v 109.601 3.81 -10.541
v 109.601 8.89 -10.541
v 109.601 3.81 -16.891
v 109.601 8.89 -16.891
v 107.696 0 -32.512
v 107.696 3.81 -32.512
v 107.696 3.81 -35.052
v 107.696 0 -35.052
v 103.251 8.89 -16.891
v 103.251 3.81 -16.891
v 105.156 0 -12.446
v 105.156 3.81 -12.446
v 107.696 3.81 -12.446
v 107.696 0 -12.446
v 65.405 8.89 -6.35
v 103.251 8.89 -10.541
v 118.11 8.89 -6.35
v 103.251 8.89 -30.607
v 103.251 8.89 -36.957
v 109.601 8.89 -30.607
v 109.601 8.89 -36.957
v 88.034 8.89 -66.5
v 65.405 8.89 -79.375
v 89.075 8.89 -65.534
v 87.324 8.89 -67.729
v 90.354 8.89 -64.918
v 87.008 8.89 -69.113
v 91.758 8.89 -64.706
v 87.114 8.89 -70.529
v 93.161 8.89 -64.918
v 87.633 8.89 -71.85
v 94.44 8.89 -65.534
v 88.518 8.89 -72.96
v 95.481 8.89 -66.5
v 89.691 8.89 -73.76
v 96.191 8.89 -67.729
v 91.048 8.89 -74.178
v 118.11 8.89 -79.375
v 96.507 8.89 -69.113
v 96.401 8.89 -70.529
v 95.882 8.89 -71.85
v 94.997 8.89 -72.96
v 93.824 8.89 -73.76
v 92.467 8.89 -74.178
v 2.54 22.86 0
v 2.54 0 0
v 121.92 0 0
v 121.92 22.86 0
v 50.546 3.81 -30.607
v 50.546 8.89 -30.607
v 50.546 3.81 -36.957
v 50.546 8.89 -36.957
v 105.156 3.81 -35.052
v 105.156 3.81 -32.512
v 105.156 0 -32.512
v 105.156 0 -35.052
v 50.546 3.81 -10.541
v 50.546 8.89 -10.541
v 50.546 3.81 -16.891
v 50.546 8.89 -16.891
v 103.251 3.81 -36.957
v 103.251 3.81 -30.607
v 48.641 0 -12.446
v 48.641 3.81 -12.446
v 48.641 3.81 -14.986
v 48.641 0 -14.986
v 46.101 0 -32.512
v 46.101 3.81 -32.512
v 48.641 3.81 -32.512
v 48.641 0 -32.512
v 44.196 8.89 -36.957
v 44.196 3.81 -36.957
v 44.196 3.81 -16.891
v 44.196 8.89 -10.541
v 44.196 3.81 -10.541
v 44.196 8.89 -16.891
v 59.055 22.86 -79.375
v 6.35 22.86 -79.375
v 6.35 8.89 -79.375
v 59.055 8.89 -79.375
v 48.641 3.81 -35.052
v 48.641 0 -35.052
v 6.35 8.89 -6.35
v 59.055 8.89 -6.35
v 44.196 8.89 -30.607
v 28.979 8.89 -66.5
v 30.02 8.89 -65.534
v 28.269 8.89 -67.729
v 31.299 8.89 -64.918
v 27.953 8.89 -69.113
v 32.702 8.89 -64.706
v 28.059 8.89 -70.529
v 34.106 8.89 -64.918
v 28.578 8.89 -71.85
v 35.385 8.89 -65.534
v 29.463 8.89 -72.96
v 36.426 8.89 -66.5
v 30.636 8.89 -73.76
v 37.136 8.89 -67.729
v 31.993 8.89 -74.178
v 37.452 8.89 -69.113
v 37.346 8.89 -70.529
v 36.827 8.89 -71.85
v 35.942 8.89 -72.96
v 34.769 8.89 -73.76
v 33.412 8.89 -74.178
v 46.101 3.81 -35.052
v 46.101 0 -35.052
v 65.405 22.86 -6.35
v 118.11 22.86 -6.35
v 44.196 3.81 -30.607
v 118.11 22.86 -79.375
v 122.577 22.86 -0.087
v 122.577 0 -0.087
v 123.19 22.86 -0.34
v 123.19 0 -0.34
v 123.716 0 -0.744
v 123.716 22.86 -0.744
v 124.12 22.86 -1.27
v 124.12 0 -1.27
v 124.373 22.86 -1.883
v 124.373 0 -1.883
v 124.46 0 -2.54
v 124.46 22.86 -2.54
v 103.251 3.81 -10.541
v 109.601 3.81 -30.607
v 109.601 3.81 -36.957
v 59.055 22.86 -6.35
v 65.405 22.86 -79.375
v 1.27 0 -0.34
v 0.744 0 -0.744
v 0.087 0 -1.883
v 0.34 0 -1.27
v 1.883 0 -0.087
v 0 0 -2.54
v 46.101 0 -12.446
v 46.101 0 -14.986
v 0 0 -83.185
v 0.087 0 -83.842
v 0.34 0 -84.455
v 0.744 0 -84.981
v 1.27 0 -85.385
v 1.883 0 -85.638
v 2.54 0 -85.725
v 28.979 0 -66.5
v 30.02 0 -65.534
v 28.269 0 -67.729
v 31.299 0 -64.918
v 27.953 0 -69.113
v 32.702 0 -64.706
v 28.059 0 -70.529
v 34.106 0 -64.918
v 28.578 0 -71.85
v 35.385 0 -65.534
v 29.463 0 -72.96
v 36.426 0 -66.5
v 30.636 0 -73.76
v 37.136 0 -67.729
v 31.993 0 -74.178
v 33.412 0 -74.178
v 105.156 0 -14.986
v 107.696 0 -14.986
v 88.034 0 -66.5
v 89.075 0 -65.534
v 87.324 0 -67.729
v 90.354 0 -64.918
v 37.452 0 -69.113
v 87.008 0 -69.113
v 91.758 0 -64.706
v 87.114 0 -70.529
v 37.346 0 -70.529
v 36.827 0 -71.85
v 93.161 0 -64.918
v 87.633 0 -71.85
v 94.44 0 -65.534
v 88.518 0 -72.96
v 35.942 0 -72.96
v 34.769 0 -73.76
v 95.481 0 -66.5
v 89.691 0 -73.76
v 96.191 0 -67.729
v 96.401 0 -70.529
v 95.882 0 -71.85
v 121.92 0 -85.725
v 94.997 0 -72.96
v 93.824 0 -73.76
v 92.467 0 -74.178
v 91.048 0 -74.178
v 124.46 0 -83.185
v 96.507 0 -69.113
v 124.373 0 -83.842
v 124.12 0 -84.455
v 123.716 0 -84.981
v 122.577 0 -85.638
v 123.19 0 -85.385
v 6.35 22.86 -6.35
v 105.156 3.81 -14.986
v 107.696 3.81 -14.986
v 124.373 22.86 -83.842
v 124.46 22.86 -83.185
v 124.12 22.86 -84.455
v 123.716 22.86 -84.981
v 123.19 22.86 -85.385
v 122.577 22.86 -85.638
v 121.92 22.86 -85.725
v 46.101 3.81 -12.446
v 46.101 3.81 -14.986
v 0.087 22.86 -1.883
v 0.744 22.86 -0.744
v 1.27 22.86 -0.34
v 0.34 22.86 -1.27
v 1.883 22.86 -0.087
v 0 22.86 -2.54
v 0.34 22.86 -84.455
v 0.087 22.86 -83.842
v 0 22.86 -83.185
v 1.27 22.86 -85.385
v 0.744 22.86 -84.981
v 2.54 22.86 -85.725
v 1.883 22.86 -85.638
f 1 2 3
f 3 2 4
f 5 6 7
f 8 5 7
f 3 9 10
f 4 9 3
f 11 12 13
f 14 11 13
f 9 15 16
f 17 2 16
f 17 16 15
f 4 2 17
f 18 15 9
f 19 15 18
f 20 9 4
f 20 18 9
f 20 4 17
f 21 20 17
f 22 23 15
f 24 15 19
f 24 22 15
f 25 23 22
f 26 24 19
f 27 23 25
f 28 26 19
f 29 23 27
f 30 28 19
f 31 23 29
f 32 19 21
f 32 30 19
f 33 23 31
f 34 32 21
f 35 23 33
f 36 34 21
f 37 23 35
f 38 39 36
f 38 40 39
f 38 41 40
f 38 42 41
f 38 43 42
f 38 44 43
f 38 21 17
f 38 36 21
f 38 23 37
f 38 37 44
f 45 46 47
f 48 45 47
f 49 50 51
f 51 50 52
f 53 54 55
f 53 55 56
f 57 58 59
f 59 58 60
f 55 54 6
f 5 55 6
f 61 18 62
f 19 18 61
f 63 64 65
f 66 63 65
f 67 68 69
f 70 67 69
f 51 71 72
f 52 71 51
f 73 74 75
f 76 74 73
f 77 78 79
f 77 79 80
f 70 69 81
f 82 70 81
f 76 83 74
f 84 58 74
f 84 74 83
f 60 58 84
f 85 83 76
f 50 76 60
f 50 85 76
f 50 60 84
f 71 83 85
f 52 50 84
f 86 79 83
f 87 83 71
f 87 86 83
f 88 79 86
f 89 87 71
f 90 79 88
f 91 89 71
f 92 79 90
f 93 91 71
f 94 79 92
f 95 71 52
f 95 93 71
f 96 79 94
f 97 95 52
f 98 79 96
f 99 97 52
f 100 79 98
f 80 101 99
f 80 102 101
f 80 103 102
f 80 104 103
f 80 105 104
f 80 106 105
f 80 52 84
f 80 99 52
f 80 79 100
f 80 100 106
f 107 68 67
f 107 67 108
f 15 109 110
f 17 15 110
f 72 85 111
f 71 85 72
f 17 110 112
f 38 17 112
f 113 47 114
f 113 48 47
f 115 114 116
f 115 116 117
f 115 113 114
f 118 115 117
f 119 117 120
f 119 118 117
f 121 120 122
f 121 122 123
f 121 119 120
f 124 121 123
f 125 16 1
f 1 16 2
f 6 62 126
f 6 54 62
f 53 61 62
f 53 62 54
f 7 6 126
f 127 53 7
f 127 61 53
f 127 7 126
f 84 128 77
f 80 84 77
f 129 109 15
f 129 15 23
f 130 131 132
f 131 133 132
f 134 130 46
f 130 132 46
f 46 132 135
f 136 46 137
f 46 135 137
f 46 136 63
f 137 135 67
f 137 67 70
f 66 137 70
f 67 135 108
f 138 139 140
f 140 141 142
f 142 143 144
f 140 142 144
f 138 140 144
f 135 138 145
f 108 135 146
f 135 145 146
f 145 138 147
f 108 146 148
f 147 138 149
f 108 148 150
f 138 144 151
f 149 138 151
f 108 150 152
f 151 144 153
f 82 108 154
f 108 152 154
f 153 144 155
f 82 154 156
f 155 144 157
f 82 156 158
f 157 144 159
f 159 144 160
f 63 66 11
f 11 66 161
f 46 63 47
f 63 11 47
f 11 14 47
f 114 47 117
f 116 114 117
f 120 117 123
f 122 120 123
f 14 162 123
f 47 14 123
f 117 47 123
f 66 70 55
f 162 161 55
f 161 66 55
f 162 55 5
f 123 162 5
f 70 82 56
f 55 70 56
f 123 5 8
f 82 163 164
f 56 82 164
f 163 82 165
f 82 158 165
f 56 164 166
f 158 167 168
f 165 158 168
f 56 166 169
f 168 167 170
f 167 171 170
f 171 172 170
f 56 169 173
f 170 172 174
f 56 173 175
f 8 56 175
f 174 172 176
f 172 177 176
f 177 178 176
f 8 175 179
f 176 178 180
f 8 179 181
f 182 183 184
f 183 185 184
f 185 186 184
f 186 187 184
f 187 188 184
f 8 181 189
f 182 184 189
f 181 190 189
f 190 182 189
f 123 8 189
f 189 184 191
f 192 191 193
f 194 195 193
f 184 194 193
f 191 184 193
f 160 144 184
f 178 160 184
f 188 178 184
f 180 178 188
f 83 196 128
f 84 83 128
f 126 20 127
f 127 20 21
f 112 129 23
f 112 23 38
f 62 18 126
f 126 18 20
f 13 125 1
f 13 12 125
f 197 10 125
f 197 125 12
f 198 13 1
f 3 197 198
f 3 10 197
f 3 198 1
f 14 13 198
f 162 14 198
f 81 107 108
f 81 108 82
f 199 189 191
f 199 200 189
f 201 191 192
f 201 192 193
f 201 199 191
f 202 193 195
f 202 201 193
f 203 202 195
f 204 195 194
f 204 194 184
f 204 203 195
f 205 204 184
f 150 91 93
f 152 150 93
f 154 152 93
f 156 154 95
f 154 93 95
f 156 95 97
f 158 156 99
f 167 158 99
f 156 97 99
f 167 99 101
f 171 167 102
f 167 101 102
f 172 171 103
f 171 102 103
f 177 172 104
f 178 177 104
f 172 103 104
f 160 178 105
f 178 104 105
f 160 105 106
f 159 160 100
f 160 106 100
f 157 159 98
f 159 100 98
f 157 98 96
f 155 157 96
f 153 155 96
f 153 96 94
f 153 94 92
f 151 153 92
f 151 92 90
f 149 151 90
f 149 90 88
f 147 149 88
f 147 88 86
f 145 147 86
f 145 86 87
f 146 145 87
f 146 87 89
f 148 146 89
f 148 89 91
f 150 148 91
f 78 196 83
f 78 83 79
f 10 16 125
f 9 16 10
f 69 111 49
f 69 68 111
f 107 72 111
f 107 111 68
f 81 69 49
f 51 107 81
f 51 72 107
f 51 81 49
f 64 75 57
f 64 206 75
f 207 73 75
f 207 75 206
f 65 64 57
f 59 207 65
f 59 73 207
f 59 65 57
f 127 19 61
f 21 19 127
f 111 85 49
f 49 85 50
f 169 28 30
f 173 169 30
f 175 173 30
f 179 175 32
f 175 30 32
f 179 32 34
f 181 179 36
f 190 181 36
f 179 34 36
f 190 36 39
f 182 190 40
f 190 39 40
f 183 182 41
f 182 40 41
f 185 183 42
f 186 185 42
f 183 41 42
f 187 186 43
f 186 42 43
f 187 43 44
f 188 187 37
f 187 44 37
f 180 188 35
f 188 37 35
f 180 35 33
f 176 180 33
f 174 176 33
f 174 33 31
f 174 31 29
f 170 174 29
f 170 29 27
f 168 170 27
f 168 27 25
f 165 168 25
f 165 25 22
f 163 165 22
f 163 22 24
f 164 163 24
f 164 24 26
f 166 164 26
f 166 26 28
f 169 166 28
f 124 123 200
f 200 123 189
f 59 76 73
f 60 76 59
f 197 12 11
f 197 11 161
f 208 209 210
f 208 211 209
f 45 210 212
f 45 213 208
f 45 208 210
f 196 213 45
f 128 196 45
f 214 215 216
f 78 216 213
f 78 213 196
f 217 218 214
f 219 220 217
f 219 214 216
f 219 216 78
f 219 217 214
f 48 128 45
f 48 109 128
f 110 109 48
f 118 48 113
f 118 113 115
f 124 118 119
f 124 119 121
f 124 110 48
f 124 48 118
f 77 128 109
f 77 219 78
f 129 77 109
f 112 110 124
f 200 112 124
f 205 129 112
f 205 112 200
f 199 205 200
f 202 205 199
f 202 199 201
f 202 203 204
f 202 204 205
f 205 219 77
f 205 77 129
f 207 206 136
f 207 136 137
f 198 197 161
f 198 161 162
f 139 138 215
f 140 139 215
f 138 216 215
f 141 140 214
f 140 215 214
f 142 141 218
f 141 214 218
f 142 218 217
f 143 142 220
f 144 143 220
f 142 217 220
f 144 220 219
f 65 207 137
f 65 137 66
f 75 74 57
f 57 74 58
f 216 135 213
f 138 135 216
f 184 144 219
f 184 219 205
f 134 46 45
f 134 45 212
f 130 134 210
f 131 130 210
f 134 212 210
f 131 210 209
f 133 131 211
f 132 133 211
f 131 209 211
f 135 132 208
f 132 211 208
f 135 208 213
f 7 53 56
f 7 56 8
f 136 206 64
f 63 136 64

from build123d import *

# Parameters (mm, degrees)
SKETCH1_W           = 65.405
SKETCH1_H           = 85.725
BOSS_EXTRUDE1_DEPTH = 22.86
SKETCH2_W           = 52.705
SKETCH2_H           = 73.025
CUT_EXTRUDE1_DEPTH  = 13.97
SKETCH6_W           = 6.35
SKETCH6_H           = 6.35
CUT_EXTRUDE3_DEPTH  = 5.08
SKETCH7_W           = 2.54
SKETCH7_H           = 2.54
CUT_EXTRUDE4_DEPTH  = 110.496539443
SKETCH5_R           = 4.7625
CUT_EXTRUDE5_DEPTH  = 109.727873841
LPATTERN3_COUNT     = 2
LPATTERN3_PITCH     = 59.055
FILLET1_R           = 2.54


with BuildPart() as part:
    # Sketch1 → Boss-Extrude1 (new body)
    with BuildSketch(Plane(origin=(0, 0, 0), x_dir=(1, 0, 0), z_dir=(0, 1, 0))):
        with Locations((32.7025, 42.8625)):
            Rectangle(SKETCH1_W, SKETCH1_H)
    boss_extrude1 = extrude(amount=BOSS_EXTRUDE1_DEPTH)

    # Sketch2 → Cut-Extrude1 (cut)
    with BuildSketch(Plane(origin=(0, 22.86, 0), x_dir=(1, 0, 0), z_dir=(0, 1, 0))):
        with Locations((32.7025, 42.8625)):
            Rectangle(SKETCH2_W, SKETCH2_H)
    cut_extrude1 = extrude(amount=-CUT_EXTRUDE1_DEPTH, mode=Mode.SUBTRACT)

    # Sketch6 → Cut-Extrude3 (cut)
    with BuildSketch(Plane(origin=(0, 8.89, 0), x_dir=(1, 0, 0), z_dir=(0, 1, 0))):
        with Locations((47.371, 33.782)):
            Rectangle(SKETCH6_W, SKETCH6_H)
        with Locations((47.371, 13.716)):
            Rectangle(SKETCH6_W, SKETCH6_H)
    cut_extrude3 = extrude(amount=-CUT_EXTRUDE3_DEPTH, mode=Mode.SUBTRACT)

    # Sketch7 → Cut-Extrude4 (cut, through all)
    with BuildSketch(Plane(origin=(0, 3.81, 0), x_dir=(1, 0, 0), z_dir=(0, 1, 0))):
        with Locations((47.371, 33.782)):
            Rectangle(SKETCH7_W, SKETCH7_H)
        with Locations((47.371, 13.716)):
            Rectangle(SKETCH7_W, SKETCH7_H)
    cut_extrude4 = extrude(amount=-CUT_EXTRUDE4_DEPTH, mode=Mode.SUBTRACT)

    # Sketch5 → Cut-Extrude5 (cut, through all)
    with BuildSketch(Plane(origin=(0, 8.89, 0), x_dir=(1, 0, 0), z_dir=(0, 1, 0))):
        with Locations(Location((32.7025, 69.469, 0), (0, 0, 270))):
            Circle(SKETCH5_R)
    cut_extrude5 = extrude(amount=-CUT_EXTRUDE5_DEPTH, mode=Mode.SUBTRACT)

    # LPattern3: Boss-Extrude1, Cut-Extrude1, Cut-Extrude3, Cut-Extrude4, Cut-Extrude5 ×2
    with Locations(*[(i * LPATTERN3_PITCH, 0, 0) for i in range(1, LPATTERN3_COUNT)]):
        add(boss_extrude1)
        add(cut_extrude1, mode=Mode.SUBTRACT)
        add(cut_extrude3, mode=Mode.SUBTRACT)
        add(cut_extrude4, mode=Mode.SUBTRACT)
        add(cut_extrude5, mode=Mode.SUBTRACT)

    # Fillet1
    fillet1_edges = [part.edges().sort_by_distance(p)[0] for p in [
        (0, 11.43, -85.725),
        (0, 11.43, 0),
        (124.46, 11.43, -85.725),
        (124.46, 11.43, 0),
    ]]
    fillet(fillet1_edges, radius=FILLET1_R)


solid = part.part
